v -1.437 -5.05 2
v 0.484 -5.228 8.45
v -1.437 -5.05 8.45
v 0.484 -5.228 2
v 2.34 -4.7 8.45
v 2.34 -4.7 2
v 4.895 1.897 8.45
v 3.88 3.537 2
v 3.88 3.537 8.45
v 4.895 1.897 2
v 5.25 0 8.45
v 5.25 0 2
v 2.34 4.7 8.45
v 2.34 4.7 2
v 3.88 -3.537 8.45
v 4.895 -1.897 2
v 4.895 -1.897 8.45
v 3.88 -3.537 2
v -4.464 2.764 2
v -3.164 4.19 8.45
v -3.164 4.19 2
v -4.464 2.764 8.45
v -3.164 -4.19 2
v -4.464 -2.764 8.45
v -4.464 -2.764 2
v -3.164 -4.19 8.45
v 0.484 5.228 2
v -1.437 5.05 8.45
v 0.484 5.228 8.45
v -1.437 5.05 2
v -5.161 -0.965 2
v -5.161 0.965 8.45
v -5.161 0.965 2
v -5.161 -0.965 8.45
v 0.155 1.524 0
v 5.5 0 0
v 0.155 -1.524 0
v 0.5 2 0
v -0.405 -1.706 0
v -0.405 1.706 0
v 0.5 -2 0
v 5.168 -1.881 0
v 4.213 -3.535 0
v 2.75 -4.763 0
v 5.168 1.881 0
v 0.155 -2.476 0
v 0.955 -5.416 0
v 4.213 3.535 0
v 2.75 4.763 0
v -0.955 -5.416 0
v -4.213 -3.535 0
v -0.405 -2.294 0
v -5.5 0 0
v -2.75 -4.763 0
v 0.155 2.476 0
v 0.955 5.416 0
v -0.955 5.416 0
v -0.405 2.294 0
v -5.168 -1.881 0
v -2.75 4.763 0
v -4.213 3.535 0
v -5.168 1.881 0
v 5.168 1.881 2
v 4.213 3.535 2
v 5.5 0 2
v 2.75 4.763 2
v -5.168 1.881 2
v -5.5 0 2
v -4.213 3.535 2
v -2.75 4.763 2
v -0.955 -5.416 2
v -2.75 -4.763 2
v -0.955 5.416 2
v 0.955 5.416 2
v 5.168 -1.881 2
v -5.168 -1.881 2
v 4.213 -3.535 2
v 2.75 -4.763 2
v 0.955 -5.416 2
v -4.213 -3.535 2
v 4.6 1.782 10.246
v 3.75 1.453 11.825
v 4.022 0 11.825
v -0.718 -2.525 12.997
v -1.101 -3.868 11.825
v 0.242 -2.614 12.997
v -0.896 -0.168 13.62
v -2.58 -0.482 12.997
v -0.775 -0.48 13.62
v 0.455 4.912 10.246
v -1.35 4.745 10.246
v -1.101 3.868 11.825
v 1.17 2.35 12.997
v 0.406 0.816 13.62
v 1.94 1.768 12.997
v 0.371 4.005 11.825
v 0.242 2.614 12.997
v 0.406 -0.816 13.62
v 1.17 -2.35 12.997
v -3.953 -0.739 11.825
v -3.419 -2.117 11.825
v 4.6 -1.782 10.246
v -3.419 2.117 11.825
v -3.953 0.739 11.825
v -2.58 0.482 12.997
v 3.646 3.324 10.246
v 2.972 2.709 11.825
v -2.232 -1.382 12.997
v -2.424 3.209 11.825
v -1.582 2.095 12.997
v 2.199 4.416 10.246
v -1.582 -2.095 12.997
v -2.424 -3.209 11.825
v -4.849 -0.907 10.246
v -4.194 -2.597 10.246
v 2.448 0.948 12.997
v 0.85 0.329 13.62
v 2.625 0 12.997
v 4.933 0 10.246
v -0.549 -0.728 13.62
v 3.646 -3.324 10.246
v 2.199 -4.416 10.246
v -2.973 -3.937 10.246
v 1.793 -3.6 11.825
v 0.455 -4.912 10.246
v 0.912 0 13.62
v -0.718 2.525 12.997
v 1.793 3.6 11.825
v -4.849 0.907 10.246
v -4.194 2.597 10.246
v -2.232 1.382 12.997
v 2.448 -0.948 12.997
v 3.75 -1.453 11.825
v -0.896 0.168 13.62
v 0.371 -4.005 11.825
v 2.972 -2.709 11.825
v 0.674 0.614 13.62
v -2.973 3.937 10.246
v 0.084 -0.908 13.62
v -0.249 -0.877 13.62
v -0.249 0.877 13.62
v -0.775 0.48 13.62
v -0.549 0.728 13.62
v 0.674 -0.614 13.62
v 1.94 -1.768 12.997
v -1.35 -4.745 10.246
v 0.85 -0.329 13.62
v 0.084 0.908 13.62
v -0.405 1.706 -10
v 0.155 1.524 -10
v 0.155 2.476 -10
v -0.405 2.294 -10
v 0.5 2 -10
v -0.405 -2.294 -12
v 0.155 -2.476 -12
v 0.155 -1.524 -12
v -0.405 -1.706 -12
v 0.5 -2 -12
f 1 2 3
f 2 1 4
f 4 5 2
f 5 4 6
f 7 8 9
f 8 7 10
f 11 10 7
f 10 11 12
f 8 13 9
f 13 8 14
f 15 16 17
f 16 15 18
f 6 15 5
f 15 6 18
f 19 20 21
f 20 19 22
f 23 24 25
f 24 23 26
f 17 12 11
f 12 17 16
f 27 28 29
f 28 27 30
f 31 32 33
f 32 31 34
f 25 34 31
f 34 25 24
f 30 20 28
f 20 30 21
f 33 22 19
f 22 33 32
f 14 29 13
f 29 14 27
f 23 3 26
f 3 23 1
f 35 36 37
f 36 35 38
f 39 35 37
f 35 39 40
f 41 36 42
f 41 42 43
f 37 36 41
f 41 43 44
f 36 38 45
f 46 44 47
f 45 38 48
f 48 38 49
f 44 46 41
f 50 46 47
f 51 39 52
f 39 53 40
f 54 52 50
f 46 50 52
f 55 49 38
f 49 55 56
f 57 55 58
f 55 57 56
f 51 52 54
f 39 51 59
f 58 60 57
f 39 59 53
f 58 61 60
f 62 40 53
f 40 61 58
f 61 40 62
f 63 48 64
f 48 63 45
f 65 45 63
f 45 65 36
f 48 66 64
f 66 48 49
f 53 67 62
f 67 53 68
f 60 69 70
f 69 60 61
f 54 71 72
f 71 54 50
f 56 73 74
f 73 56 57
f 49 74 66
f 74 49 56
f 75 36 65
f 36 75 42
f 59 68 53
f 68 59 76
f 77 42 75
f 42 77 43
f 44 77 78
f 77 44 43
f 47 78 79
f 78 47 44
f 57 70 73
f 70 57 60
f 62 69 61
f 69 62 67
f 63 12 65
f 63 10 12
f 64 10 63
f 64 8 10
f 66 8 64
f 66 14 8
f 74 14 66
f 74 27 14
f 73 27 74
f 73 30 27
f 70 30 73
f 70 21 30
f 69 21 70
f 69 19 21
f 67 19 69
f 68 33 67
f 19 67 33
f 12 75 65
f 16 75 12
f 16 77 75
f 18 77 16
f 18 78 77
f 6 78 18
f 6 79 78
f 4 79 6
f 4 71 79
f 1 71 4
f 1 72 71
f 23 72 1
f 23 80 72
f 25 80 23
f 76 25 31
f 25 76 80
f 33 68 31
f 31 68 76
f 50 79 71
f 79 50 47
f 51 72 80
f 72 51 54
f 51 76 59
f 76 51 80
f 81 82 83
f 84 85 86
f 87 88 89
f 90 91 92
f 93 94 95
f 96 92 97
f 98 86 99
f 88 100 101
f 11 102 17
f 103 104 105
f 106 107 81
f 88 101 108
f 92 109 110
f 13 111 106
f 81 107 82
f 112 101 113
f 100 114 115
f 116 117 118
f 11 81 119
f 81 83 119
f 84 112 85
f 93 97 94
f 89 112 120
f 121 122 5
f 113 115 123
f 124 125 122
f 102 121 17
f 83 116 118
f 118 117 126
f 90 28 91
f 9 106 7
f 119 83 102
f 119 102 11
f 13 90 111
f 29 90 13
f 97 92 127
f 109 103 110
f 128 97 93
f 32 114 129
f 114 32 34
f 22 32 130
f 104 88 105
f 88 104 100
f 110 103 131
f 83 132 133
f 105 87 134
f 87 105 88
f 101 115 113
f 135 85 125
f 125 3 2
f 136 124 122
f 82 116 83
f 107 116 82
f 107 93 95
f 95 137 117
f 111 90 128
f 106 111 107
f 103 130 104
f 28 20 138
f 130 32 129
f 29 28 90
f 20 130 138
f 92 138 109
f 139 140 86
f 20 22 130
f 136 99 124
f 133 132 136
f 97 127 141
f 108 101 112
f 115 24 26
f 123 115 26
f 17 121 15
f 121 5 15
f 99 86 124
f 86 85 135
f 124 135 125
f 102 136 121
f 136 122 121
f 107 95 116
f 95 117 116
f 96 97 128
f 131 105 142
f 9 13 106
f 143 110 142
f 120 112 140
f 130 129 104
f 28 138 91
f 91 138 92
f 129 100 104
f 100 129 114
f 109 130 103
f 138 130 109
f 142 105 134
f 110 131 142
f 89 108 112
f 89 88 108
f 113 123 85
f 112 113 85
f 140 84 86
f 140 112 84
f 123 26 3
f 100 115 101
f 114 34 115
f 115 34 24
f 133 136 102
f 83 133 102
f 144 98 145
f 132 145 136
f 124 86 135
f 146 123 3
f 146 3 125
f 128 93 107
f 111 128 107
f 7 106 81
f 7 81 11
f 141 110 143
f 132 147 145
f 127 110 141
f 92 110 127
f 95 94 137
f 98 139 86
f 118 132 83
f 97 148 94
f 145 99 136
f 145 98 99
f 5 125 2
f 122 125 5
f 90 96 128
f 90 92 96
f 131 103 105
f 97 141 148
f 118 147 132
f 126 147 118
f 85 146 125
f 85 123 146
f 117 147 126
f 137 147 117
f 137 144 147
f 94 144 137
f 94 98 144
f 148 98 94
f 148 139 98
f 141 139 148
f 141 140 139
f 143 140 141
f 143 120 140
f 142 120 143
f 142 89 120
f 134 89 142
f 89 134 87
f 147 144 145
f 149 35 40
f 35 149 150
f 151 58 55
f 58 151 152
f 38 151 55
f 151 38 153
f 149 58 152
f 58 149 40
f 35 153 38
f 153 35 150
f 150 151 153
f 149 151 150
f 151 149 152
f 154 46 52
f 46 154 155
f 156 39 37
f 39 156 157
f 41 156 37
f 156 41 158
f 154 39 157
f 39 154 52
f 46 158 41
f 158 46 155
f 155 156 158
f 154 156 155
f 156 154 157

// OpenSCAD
module led_5(diameter, height, tolerance){
    
    // Add tolerance.
    total_diameter = diameter+tolerance;
    
    // Derive remaining dimensions from the overall measurements.
    lip_radius = total_diameter/2;
    lip_height = 2; // TODO: this probably shouldn't be hard-coded.
    body_radius = (total_diameter-.5)/2;
    dome_radius = body_radius;
    body_height = height-dome_radius;
    
    color("red"){
        // Body.
        cylinder(r=body_radius,h=body_height);
        // Lip.
        cylinder(r=lip_radius,h=lip_height);
        // Dome.
        //translate([0,0,LED_HEIGHT-(LED_DIAMETER/2)]){
        translate([0,0,height-body_radius]){
            sphere(r=dome_radius);
        }
    }
    // Leads.
    color("gray"){
        translate([0,2,-10]){
            cylinder(r=.5,h=10);
        }
        translate([0,-2,-12]){
            cylinder(r=.5,h=12);
        }
    }
}

// Example.
led_5(10,13.7,1);
